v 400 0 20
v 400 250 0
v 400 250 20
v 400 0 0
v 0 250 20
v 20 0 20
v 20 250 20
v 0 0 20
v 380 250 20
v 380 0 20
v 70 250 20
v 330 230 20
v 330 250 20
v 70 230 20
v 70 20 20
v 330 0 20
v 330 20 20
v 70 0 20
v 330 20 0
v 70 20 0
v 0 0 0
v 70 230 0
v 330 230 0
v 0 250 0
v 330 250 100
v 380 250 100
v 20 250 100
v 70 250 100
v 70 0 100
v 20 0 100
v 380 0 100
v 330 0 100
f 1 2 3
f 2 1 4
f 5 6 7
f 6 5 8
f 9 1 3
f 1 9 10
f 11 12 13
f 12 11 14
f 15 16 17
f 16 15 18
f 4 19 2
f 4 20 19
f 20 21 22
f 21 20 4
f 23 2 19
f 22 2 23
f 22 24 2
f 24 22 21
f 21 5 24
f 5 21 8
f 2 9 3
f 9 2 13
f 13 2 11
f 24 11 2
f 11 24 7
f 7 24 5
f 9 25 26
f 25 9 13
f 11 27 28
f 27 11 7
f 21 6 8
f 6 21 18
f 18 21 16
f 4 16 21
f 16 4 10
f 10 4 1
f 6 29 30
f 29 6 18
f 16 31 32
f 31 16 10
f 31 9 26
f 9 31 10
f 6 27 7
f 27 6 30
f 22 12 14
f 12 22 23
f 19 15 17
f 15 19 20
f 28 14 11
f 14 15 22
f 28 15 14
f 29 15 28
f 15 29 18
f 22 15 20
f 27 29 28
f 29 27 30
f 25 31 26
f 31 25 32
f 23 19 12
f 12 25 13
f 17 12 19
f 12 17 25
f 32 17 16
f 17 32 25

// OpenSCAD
module monitor_riser(width = 400, depth = 250, height = 100, leg_width = 50, leg_thickness = 20) {
  // Main top surface
  difference() {
    cube([width, depth, leg_thickness]);

    // Create a thin rectangular cutout for the main top
    translate([leg_thickness, leg_thickness, -1])
    cube([width - (2* leg_thickness), depth - (2* leg_thickness), leg_thickness + 2]);


  }
  // Left Leg
  translate([leg_thickness, 0, 0])
    cube([leg_width, depth, height]);

   // Right Leg
  translate([width - (leg_thickness + leg_width), 0, 0])
    cube([leg_width, depth, height]);

}

monitor_riser();
